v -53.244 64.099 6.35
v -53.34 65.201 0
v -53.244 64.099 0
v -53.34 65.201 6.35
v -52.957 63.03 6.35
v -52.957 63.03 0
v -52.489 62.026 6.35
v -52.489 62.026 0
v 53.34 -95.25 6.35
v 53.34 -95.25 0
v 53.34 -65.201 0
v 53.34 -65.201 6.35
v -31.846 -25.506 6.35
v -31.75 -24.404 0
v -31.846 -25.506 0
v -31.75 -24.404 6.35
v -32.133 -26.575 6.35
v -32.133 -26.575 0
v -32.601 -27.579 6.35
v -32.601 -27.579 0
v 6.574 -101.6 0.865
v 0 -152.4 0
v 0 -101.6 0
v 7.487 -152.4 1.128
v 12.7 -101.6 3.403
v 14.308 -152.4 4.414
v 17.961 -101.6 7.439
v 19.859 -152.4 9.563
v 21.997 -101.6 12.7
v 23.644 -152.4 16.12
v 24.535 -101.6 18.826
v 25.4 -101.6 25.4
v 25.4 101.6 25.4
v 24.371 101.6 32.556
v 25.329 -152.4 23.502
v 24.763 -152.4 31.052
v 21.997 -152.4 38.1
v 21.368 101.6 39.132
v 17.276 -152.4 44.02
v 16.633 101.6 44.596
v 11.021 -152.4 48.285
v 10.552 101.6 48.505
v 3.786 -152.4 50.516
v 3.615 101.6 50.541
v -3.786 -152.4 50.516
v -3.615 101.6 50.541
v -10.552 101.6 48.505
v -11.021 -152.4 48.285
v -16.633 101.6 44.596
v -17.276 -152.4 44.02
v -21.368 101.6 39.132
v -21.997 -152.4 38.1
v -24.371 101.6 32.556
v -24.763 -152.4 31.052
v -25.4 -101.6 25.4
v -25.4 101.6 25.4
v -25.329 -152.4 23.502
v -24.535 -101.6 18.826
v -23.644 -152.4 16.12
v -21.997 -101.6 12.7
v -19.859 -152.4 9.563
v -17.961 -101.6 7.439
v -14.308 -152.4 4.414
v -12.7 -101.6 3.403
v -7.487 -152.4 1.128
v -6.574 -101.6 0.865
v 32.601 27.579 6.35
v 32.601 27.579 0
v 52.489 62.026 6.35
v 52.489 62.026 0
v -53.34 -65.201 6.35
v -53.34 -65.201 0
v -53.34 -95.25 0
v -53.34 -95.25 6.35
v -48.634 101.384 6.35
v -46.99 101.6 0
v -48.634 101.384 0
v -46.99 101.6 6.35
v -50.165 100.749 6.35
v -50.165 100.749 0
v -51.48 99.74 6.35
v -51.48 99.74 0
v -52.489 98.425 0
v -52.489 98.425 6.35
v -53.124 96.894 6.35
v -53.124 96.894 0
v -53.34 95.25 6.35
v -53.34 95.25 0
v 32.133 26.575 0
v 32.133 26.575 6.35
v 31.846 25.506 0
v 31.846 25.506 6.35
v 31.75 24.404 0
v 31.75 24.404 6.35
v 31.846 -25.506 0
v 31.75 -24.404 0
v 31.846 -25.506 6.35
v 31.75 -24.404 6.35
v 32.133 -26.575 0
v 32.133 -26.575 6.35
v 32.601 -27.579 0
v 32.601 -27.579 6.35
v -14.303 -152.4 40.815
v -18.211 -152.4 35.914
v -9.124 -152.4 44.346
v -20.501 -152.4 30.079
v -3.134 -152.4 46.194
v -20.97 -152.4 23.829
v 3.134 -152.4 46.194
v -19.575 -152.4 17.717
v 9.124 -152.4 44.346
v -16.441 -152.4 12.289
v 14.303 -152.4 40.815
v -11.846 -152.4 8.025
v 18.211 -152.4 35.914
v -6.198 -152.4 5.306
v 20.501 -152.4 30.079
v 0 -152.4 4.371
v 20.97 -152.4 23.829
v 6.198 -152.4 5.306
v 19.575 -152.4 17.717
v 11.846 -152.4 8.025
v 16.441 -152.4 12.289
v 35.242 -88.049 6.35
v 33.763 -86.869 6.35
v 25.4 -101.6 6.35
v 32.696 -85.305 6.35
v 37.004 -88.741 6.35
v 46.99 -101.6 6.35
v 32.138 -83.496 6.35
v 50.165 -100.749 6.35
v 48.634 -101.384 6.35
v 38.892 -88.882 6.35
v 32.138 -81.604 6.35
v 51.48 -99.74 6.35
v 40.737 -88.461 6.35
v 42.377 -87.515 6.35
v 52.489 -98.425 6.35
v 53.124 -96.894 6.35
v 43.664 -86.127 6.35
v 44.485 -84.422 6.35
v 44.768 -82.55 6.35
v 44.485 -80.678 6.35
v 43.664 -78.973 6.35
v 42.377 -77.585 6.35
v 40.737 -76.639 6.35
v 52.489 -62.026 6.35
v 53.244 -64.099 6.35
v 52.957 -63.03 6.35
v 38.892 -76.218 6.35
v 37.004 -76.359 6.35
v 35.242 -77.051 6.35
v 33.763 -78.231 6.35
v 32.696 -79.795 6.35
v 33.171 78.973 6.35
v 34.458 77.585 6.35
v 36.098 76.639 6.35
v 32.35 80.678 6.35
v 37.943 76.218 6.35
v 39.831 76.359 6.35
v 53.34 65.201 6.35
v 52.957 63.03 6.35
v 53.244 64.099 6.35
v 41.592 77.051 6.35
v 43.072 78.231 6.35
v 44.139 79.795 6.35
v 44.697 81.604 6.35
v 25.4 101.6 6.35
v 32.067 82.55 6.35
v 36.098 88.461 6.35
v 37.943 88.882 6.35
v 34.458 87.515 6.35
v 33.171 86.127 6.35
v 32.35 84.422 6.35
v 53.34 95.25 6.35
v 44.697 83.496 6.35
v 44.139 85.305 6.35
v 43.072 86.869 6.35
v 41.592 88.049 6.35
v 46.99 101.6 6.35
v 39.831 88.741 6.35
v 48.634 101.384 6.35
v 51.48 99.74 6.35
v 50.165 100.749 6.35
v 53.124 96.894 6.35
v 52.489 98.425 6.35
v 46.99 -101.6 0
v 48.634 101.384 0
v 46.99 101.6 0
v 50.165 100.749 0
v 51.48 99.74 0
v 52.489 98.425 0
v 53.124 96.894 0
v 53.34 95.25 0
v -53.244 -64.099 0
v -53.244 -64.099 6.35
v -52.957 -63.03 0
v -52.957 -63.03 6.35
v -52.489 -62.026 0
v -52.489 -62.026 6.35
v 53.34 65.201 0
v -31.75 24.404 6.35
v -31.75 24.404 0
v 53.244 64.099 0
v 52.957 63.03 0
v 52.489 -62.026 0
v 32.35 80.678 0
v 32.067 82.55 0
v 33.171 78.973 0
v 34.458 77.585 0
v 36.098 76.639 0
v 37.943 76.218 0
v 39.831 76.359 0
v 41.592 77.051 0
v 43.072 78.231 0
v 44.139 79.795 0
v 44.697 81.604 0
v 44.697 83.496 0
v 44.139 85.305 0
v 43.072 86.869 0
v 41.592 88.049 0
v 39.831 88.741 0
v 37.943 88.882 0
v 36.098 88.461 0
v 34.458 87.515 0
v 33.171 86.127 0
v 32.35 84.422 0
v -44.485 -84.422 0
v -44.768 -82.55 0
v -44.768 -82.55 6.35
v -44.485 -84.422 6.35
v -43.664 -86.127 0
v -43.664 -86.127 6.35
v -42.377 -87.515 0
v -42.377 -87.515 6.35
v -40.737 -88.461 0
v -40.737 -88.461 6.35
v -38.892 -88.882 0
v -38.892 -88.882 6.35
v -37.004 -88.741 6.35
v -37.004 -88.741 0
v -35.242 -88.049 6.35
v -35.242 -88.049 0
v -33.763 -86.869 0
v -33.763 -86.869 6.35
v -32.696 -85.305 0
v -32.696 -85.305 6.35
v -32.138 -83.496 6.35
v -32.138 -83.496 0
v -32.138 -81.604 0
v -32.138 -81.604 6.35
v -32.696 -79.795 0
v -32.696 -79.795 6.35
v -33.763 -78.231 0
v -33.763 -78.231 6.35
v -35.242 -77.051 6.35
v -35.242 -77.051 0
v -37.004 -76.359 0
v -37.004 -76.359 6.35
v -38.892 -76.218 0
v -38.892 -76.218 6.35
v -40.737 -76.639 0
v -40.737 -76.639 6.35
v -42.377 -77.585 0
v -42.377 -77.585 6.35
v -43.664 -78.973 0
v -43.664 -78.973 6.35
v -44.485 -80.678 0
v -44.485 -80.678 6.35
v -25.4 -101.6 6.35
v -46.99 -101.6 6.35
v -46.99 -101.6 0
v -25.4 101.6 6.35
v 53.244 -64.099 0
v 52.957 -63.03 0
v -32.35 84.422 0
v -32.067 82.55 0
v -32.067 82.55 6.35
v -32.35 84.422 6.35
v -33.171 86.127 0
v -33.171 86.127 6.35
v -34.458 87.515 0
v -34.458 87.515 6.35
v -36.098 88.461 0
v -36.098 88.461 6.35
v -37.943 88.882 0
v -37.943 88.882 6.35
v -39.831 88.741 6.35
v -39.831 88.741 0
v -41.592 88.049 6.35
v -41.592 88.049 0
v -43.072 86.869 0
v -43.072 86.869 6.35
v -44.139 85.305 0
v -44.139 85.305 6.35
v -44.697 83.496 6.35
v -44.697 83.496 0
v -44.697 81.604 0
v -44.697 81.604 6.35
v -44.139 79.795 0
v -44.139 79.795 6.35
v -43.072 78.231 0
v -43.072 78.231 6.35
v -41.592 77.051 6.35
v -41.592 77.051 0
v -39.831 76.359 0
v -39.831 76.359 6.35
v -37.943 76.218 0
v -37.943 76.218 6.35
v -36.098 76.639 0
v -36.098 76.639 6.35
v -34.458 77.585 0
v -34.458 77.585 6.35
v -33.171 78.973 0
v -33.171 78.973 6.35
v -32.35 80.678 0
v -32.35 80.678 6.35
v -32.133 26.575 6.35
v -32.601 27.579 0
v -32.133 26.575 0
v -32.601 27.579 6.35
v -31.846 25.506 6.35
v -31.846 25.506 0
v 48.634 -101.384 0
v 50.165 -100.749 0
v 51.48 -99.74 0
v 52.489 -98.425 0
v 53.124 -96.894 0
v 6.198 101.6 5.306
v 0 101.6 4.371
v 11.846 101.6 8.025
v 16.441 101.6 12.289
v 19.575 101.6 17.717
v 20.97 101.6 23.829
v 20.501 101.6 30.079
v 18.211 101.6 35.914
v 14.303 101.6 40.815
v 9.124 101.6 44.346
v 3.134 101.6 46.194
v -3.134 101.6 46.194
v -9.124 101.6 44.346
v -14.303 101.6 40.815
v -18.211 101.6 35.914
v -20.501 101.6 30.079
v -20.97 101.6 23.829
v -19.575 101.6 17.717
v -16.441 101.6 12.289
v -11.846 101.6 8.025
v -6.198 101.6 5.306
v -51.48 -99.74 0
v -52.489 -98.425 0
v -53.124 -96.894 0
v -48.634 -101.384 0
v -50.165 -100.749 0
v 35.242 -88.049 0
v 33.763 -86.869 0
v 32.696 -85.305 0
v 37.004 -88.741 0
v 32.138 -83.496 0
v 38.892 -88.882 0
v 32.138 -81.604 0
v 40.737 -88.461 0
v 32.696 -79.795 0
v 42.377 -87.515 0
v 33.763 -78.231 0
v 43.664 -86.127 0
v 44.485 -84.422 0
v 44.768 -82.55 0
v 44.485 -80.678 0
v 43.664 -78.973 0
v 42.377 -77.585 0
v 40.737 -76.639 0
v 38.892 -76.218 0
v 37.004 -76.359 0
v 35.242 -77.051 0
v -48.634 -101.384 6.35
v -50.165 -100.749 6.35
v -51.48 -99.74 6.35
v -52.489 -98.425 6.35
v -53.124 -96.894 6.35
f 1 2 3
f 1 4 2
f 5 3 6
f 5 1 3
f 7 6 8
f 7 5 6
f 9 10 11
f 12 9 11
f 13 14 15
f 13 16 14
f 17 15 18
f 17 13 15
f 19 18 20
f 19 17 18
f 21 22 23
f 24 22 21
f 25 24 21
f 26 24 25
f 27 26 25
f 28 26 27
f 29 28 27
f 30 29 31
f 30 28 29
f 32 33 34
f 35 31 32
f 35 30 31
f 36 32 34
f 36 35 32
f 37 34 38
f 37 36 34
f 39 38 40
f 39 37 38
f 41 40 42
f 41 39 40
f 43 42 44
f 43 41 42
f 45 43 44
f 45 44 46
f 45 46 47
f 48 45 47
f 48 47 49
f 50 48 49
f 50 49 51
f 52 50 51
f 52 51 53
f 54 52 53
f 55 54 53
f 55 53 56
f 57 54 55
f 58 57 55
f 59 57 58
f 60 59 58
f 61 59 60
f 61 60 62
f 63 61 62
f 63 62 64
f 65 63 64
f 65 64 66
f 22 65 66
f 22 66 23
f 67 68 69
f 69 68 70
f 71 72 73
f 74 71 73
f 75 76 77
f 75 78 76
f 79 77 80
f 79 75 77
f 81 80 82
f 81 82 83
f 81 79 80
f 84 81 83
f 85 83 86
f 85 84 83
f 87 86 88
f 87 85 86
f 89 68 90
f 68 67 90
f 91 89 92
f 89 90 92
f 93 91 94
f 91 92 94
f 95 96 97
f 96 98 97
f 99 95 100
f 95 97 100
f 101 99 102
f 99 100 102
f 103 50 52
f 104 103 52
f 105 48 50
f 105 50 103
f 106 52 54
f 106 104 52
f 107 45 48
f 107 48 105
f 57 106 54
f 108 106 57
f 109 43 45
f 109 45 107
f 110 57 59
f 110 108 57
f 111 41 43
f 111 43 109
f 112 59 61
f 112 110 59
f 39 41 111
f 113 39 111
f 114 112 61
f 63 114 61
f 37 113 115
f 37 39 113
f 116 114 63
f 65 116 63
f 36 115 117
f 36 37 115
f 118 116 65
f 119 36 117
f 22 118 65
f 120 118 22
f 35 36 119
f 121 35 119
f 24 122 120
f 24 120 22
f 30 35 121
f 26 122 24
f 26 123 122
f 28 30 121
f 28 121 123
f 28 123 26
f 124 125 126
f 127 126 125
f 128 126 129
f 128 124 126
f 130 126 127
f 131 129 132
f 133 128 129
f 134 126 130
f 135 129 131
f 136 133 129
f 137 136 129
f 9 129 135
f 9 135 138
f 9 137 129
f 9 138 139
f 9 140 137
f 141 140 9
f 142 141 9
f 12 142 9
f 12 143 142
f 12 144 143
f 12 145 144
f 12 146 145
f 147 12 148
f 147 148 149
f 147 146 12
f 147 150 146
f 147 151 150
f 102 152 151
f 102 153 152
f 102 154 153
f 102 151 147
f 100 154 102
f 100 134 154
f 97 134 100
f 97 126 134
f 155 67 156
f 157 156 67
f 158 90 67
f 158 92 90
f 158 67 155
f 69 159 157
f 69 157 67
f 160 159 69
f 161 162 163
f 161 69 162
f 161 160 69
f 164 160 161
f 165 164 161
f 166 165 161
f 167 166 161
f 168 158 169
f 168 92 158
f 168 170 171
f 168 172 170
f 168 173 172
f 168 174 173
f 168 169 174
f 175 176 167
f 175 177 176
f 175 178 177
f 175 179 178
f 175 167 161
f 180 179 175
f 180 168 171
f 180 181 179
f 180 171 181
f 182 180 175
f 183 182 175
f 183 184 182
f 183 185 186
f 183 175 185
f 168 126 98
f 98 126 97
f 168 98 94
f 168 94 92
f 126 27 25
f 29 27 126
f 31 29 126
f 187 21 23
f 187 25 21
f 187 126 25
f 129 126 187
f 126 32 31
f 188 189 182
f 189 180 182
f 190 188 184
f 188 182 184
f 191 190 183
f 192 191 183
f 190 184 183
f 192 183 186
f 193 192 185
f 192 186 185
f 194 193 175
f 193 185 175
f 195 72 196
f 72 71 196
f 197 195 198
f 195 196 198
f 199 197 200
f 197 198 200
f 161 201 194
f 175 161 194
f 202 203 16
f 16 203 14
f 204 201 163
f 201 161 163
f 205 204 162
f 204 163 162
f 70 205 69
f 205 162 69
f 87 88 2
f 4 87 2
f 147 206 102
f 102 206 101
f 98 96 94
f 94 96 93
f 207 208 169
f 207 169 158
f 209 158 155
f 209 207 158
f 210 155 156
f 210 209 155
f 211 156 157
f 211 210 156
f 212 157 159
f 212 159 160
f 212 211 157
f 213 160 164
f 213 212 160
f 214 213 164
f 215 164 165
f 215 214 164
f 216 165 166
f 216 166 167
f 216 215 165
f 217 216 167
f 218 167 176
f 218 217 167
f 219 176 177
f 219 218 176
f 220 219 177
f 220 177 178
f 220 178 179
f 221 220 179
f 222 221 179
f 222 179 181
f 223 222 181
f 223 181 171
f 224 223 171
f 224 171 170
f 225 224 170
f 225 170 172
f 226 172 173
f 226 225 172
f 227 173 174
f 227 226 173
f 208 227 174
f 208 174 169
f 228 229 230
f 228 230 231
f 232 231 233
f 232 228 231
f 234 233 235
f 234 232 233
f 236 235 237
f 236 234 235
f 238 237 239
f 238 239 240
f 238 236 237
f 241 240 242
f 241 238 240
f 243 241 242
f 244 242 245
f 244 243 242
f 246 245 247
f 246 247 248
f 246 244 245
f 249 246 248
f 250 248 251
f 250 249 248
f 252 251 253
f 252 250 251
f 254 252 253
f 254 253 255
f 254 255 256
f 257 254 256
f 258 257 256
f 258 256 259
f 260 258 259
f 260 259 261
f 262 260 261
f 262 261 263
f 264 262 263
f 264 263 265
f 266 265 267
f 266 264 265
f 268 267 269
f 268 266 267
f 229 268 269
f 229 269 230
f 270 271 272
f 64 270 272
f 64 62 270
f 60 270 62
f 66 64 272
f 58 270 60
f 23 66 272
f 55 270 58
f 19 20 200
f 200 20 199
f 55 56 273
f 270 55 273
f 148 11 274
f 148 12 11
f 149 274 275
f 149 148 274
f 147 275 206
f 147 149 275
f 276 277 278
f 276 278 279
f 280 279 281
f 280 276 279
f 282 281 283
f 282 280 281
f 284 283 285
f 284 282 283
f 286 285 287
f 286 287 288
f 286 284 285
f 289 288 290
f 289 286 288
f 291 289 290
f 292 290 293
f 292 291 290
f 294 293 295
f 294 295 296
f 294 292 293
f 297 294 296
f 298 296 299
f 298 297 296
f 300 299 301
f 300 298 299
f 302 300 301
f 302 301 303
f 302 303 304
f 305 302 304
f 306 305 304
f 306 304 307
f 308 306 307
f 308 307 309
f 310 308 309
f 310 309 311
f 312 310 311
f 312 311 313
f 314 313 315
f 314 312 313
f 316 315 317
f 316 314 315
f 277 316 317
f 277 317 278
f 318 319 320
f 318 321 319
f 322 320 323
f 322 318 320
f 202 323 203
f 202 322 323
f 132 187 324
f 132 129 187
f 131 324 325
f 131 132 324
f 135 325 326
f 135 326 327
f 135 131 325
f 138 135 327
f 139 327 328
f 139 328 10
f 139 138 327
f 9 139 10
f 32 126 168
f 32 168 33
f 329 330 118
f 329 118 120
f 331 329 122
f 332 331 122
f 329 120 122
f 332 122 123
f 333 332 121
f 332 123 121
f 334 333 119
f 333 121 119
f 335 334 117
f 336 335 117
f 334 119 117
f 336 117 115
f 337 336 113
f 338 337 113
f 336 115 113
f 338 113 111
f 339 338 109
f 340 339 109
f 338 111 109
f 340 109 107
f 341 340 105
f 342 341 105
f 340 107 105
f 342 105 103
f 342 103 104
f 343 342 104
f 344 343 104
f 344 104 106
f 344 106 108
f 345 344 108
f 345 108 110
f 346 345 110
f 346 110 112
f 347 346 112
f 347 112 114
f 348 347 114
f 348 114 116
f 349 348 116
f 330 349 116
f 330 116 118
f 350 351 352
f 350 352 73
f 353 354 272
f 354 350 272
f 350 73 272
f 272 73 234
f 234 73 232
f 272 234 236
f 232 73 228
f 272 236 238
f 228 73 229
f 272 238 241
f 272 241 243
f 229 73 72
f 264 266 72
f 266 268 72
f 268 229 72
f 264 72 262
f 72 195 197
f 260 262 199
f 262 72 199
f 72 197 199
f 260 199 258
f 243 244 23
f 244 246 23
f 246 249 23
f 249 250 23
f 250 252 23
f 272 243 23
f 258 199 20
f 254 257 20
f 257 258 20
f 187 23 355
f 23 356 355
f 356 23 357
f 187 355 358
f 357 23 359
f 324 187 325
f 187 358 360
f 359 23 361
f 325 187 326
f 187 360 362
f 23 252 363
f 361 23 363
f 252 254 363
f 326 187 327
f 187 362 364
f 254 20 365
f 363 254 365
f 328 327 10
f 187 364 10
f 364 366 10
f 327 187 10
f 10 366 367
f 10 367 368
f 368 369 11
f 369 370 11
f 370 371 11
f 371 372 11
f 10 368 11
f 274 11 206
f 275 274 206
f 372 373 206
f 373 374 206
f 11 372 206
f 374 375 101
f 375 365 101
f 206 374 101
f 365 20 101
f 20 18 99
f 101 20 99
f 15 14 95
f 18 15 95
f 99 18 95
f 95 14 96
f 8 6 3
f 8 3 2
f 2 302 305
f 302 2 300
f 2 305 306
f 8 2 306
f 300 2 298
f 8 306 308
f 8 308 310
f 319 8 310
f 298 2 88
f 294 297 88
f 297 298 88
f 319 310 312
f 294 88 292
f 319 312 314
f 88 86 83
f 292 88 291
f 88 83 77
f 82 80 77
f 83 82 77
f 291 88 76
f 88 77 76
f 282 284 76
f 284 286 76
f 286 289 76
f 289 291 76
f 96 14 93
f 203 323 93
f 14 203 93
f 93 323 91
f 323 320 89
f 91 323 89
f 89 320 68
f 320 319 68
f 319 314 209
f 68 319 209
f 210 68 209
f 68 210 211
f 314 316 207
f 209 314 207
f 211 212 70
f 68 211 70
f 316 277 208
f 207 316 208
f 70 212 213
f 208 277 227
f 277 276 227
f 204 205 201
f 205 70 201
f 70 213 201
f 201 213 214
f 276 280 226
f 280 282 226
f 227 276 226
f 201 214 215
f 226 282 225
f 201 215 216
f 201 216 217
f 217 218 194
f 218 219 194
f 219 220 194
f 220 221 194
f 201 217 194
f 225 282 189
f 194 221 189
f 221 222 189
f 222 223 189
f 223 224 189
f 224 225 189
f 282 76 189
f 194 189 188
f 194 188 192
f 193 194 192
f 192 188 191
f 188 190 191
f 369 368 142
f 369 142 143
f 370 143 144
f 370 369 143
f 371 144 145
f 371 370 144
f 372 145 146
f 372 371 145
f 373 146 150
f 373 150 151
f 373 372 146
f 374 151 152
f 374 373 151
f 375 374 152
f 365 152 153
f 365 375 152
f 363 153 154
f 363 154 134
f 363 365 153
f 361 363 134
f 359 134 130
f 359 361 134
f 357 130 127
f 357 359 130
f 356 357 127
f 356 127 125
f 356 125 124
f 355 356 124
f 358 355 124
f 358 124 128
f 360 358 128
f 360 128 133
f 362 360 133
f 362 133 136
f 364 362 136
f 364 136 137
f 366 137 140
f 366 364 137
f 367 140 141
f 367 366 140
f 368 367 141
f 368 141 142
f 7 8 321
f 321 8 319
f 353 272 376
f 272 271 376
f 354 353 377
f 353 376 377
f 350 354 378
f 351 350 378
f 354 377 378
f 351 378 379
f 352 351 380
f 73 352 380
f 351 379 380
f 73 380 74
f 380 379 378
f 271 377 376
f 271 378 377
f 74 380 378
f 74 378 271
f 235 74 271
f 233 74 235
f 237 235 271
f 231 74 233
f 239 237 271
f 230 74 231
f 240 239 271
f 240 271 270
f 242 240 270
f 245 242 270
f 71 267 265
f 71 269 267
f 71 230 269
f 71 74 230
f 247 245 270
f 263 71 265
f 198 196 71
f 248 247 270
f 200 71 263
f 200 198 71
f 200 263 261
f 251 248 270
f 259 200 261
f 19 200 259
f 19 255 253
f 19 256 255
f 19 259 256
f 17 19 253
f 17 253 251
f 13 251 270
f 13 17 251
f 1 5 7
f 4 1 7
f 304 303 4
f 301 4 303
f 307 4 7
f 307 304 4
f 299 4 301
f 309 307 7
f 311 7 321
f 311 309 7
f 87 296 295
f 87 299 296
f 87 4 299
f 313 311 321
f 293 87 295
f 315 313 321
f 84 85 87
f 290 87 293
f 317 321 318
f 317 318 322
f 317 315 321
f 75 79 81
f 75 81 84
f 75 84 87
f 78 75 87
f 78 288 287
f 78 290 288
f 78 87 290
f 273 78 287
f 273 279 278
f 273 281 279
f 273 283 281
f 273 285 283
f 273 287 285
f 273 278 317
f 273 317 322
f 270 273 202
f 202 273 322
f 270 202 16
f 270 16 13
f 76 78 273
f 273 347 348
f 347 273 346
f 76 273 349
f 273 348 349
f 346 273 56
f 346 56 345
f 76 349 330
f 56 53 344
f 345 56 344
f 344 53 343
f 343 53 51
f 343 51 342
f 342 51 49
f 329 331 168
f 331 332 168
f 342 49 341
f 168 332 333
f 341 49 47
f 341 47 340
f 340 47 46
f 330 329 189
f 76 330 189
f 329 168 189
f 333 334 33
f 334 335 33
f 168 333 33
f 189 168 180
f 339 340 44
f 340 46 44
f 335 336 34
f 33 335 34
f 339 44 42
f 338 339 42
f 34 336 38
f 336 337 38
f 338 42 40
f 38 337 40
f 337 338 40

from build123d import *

# Parameters (mm, degrees)
SKETCH2_R           = 6.35
BOSS_EXTRUDE1_DEPTH = 6.35
BOSS_EXTRUDE7_DEPTH = 203.2
BOSS_EXTRUDE8_START = 50.8
SKETCH4_R           = 25.4
BOSS_EXTRUDE8_DEPTH = 50.8
SKETCH5_R           = 21.02866
CUT_EXTRUDE2_DEPTH  = 265.465112255
FILLET1_R           = 6.35


with BuildPart() as part:
    # Sketch2 → Boss-Extrude1 (new body)
    with BuildSketch(Plane.XY):
        Polygon((-53.34, -101.6), (53.34, -101.6), (53.34, -63.5), (31.75, -26.105023065), (31.75, 26.105023065), (53.34, 63.5), (53.34, 101.6), (-53.34, 101.6), (-53.34, 63.5), (-31.75, 26.105023065), (-31.75, -26.105023065), (-53.34, -63.5), align=None)
        with Locations((-38.4175, 82.55)):
            Circle(SKETCH2_R, mode=Mode.SUBTRACT)
        with Locations(Location((-38.4175, -82.55, 0), (0, 0, 180))):
            Circle(SKETCH2_R, mode=Mode.SUBTRACT)
        with Locations((38.4175, -82.55)):
            Circle(SKETCH2_R, mode=Mode.SUBTRACT)
        with Locations(Location((38.4175, 82.55, 0), (0, 0, 180))):
            Circle(SKETCH2_R, mode=Mode.SUBTRACT)
    extrude(amount=BOSS_EXTRUDE1_DEPTH)

    # Sketch3 → Boss-Extrude7 (add)
    with BuildSketch(Plane.XZ.offset(101.6)):
        with BuildLine():
            Line((-25.4, 25.4), (-25.4, 6.35))
            Line((-25.4, 6.35), (-16.800520825, 6.35))
            ThreePointArc((-16.800520825, 6.35), (0, 0), (16.800520825, 6.35))
            Line((16.800520825, 6.35), (25.4, 6.35))
            Line((25.4, 6.35), (25.4, 25.4))
            ThreePointArc((25.4, 25.4), (0, 50.8), (-25.4, 25.4))
        make_face()
    extrude(amount=-BOSS_EXTRUDE7_DEPTH)

    # Sketch4 → Boss-Extrude8 (add)
    with BuildSketch(Plane.XZ.offset(101.6).offset(BOSS_EXTRUDE8_START)):
        with Locations(Location((0, 25.4, 0), (0, 0, 270))):
            Circle(SKETCH4_R)
    extrude(amount=-BOSS_EXTRUDE8_DEPTH)

    # Sketch5 → Cut-Extrude2 (cut, through all)
    with BuildSketch(Plane.XZ.offset(152.4)):
        with Locations(Location((0, 25.4, 0), (0, 0, 270))):
            Circle(SKETCH5_R)
    extrude(amount=-CUT_EXTRUDE2_DEPTH, mode=Mode.SUBTRACT)

    # Fillet1
    fillet1_edges = [part.edges().sort_by_distance(p)[0] for p in [
        (53.34, 63.5, 3.175),
        (31.75, 26.105023065, 3.175),
        (31.75, -26.105023065, 3.175),
        (53.34, -63.5, 3.175),
        (53.34, -101.6, 3.175),
        (-53.34, -101.6, 3.175),
        (-53.34, -63.5, 3.175),
        (-31.75, -26.105023065, 3.175),
        (-31.75, 26.105023065, 3.175),
        (-53.34, 63.5, 3.175),
        (-53.34, 101.6, 3.175),
        (53.34, 101.6, 3.175),
    ]]
    fillet(fillet1_edges, radius=FILLET1_R)


solid = part.part
